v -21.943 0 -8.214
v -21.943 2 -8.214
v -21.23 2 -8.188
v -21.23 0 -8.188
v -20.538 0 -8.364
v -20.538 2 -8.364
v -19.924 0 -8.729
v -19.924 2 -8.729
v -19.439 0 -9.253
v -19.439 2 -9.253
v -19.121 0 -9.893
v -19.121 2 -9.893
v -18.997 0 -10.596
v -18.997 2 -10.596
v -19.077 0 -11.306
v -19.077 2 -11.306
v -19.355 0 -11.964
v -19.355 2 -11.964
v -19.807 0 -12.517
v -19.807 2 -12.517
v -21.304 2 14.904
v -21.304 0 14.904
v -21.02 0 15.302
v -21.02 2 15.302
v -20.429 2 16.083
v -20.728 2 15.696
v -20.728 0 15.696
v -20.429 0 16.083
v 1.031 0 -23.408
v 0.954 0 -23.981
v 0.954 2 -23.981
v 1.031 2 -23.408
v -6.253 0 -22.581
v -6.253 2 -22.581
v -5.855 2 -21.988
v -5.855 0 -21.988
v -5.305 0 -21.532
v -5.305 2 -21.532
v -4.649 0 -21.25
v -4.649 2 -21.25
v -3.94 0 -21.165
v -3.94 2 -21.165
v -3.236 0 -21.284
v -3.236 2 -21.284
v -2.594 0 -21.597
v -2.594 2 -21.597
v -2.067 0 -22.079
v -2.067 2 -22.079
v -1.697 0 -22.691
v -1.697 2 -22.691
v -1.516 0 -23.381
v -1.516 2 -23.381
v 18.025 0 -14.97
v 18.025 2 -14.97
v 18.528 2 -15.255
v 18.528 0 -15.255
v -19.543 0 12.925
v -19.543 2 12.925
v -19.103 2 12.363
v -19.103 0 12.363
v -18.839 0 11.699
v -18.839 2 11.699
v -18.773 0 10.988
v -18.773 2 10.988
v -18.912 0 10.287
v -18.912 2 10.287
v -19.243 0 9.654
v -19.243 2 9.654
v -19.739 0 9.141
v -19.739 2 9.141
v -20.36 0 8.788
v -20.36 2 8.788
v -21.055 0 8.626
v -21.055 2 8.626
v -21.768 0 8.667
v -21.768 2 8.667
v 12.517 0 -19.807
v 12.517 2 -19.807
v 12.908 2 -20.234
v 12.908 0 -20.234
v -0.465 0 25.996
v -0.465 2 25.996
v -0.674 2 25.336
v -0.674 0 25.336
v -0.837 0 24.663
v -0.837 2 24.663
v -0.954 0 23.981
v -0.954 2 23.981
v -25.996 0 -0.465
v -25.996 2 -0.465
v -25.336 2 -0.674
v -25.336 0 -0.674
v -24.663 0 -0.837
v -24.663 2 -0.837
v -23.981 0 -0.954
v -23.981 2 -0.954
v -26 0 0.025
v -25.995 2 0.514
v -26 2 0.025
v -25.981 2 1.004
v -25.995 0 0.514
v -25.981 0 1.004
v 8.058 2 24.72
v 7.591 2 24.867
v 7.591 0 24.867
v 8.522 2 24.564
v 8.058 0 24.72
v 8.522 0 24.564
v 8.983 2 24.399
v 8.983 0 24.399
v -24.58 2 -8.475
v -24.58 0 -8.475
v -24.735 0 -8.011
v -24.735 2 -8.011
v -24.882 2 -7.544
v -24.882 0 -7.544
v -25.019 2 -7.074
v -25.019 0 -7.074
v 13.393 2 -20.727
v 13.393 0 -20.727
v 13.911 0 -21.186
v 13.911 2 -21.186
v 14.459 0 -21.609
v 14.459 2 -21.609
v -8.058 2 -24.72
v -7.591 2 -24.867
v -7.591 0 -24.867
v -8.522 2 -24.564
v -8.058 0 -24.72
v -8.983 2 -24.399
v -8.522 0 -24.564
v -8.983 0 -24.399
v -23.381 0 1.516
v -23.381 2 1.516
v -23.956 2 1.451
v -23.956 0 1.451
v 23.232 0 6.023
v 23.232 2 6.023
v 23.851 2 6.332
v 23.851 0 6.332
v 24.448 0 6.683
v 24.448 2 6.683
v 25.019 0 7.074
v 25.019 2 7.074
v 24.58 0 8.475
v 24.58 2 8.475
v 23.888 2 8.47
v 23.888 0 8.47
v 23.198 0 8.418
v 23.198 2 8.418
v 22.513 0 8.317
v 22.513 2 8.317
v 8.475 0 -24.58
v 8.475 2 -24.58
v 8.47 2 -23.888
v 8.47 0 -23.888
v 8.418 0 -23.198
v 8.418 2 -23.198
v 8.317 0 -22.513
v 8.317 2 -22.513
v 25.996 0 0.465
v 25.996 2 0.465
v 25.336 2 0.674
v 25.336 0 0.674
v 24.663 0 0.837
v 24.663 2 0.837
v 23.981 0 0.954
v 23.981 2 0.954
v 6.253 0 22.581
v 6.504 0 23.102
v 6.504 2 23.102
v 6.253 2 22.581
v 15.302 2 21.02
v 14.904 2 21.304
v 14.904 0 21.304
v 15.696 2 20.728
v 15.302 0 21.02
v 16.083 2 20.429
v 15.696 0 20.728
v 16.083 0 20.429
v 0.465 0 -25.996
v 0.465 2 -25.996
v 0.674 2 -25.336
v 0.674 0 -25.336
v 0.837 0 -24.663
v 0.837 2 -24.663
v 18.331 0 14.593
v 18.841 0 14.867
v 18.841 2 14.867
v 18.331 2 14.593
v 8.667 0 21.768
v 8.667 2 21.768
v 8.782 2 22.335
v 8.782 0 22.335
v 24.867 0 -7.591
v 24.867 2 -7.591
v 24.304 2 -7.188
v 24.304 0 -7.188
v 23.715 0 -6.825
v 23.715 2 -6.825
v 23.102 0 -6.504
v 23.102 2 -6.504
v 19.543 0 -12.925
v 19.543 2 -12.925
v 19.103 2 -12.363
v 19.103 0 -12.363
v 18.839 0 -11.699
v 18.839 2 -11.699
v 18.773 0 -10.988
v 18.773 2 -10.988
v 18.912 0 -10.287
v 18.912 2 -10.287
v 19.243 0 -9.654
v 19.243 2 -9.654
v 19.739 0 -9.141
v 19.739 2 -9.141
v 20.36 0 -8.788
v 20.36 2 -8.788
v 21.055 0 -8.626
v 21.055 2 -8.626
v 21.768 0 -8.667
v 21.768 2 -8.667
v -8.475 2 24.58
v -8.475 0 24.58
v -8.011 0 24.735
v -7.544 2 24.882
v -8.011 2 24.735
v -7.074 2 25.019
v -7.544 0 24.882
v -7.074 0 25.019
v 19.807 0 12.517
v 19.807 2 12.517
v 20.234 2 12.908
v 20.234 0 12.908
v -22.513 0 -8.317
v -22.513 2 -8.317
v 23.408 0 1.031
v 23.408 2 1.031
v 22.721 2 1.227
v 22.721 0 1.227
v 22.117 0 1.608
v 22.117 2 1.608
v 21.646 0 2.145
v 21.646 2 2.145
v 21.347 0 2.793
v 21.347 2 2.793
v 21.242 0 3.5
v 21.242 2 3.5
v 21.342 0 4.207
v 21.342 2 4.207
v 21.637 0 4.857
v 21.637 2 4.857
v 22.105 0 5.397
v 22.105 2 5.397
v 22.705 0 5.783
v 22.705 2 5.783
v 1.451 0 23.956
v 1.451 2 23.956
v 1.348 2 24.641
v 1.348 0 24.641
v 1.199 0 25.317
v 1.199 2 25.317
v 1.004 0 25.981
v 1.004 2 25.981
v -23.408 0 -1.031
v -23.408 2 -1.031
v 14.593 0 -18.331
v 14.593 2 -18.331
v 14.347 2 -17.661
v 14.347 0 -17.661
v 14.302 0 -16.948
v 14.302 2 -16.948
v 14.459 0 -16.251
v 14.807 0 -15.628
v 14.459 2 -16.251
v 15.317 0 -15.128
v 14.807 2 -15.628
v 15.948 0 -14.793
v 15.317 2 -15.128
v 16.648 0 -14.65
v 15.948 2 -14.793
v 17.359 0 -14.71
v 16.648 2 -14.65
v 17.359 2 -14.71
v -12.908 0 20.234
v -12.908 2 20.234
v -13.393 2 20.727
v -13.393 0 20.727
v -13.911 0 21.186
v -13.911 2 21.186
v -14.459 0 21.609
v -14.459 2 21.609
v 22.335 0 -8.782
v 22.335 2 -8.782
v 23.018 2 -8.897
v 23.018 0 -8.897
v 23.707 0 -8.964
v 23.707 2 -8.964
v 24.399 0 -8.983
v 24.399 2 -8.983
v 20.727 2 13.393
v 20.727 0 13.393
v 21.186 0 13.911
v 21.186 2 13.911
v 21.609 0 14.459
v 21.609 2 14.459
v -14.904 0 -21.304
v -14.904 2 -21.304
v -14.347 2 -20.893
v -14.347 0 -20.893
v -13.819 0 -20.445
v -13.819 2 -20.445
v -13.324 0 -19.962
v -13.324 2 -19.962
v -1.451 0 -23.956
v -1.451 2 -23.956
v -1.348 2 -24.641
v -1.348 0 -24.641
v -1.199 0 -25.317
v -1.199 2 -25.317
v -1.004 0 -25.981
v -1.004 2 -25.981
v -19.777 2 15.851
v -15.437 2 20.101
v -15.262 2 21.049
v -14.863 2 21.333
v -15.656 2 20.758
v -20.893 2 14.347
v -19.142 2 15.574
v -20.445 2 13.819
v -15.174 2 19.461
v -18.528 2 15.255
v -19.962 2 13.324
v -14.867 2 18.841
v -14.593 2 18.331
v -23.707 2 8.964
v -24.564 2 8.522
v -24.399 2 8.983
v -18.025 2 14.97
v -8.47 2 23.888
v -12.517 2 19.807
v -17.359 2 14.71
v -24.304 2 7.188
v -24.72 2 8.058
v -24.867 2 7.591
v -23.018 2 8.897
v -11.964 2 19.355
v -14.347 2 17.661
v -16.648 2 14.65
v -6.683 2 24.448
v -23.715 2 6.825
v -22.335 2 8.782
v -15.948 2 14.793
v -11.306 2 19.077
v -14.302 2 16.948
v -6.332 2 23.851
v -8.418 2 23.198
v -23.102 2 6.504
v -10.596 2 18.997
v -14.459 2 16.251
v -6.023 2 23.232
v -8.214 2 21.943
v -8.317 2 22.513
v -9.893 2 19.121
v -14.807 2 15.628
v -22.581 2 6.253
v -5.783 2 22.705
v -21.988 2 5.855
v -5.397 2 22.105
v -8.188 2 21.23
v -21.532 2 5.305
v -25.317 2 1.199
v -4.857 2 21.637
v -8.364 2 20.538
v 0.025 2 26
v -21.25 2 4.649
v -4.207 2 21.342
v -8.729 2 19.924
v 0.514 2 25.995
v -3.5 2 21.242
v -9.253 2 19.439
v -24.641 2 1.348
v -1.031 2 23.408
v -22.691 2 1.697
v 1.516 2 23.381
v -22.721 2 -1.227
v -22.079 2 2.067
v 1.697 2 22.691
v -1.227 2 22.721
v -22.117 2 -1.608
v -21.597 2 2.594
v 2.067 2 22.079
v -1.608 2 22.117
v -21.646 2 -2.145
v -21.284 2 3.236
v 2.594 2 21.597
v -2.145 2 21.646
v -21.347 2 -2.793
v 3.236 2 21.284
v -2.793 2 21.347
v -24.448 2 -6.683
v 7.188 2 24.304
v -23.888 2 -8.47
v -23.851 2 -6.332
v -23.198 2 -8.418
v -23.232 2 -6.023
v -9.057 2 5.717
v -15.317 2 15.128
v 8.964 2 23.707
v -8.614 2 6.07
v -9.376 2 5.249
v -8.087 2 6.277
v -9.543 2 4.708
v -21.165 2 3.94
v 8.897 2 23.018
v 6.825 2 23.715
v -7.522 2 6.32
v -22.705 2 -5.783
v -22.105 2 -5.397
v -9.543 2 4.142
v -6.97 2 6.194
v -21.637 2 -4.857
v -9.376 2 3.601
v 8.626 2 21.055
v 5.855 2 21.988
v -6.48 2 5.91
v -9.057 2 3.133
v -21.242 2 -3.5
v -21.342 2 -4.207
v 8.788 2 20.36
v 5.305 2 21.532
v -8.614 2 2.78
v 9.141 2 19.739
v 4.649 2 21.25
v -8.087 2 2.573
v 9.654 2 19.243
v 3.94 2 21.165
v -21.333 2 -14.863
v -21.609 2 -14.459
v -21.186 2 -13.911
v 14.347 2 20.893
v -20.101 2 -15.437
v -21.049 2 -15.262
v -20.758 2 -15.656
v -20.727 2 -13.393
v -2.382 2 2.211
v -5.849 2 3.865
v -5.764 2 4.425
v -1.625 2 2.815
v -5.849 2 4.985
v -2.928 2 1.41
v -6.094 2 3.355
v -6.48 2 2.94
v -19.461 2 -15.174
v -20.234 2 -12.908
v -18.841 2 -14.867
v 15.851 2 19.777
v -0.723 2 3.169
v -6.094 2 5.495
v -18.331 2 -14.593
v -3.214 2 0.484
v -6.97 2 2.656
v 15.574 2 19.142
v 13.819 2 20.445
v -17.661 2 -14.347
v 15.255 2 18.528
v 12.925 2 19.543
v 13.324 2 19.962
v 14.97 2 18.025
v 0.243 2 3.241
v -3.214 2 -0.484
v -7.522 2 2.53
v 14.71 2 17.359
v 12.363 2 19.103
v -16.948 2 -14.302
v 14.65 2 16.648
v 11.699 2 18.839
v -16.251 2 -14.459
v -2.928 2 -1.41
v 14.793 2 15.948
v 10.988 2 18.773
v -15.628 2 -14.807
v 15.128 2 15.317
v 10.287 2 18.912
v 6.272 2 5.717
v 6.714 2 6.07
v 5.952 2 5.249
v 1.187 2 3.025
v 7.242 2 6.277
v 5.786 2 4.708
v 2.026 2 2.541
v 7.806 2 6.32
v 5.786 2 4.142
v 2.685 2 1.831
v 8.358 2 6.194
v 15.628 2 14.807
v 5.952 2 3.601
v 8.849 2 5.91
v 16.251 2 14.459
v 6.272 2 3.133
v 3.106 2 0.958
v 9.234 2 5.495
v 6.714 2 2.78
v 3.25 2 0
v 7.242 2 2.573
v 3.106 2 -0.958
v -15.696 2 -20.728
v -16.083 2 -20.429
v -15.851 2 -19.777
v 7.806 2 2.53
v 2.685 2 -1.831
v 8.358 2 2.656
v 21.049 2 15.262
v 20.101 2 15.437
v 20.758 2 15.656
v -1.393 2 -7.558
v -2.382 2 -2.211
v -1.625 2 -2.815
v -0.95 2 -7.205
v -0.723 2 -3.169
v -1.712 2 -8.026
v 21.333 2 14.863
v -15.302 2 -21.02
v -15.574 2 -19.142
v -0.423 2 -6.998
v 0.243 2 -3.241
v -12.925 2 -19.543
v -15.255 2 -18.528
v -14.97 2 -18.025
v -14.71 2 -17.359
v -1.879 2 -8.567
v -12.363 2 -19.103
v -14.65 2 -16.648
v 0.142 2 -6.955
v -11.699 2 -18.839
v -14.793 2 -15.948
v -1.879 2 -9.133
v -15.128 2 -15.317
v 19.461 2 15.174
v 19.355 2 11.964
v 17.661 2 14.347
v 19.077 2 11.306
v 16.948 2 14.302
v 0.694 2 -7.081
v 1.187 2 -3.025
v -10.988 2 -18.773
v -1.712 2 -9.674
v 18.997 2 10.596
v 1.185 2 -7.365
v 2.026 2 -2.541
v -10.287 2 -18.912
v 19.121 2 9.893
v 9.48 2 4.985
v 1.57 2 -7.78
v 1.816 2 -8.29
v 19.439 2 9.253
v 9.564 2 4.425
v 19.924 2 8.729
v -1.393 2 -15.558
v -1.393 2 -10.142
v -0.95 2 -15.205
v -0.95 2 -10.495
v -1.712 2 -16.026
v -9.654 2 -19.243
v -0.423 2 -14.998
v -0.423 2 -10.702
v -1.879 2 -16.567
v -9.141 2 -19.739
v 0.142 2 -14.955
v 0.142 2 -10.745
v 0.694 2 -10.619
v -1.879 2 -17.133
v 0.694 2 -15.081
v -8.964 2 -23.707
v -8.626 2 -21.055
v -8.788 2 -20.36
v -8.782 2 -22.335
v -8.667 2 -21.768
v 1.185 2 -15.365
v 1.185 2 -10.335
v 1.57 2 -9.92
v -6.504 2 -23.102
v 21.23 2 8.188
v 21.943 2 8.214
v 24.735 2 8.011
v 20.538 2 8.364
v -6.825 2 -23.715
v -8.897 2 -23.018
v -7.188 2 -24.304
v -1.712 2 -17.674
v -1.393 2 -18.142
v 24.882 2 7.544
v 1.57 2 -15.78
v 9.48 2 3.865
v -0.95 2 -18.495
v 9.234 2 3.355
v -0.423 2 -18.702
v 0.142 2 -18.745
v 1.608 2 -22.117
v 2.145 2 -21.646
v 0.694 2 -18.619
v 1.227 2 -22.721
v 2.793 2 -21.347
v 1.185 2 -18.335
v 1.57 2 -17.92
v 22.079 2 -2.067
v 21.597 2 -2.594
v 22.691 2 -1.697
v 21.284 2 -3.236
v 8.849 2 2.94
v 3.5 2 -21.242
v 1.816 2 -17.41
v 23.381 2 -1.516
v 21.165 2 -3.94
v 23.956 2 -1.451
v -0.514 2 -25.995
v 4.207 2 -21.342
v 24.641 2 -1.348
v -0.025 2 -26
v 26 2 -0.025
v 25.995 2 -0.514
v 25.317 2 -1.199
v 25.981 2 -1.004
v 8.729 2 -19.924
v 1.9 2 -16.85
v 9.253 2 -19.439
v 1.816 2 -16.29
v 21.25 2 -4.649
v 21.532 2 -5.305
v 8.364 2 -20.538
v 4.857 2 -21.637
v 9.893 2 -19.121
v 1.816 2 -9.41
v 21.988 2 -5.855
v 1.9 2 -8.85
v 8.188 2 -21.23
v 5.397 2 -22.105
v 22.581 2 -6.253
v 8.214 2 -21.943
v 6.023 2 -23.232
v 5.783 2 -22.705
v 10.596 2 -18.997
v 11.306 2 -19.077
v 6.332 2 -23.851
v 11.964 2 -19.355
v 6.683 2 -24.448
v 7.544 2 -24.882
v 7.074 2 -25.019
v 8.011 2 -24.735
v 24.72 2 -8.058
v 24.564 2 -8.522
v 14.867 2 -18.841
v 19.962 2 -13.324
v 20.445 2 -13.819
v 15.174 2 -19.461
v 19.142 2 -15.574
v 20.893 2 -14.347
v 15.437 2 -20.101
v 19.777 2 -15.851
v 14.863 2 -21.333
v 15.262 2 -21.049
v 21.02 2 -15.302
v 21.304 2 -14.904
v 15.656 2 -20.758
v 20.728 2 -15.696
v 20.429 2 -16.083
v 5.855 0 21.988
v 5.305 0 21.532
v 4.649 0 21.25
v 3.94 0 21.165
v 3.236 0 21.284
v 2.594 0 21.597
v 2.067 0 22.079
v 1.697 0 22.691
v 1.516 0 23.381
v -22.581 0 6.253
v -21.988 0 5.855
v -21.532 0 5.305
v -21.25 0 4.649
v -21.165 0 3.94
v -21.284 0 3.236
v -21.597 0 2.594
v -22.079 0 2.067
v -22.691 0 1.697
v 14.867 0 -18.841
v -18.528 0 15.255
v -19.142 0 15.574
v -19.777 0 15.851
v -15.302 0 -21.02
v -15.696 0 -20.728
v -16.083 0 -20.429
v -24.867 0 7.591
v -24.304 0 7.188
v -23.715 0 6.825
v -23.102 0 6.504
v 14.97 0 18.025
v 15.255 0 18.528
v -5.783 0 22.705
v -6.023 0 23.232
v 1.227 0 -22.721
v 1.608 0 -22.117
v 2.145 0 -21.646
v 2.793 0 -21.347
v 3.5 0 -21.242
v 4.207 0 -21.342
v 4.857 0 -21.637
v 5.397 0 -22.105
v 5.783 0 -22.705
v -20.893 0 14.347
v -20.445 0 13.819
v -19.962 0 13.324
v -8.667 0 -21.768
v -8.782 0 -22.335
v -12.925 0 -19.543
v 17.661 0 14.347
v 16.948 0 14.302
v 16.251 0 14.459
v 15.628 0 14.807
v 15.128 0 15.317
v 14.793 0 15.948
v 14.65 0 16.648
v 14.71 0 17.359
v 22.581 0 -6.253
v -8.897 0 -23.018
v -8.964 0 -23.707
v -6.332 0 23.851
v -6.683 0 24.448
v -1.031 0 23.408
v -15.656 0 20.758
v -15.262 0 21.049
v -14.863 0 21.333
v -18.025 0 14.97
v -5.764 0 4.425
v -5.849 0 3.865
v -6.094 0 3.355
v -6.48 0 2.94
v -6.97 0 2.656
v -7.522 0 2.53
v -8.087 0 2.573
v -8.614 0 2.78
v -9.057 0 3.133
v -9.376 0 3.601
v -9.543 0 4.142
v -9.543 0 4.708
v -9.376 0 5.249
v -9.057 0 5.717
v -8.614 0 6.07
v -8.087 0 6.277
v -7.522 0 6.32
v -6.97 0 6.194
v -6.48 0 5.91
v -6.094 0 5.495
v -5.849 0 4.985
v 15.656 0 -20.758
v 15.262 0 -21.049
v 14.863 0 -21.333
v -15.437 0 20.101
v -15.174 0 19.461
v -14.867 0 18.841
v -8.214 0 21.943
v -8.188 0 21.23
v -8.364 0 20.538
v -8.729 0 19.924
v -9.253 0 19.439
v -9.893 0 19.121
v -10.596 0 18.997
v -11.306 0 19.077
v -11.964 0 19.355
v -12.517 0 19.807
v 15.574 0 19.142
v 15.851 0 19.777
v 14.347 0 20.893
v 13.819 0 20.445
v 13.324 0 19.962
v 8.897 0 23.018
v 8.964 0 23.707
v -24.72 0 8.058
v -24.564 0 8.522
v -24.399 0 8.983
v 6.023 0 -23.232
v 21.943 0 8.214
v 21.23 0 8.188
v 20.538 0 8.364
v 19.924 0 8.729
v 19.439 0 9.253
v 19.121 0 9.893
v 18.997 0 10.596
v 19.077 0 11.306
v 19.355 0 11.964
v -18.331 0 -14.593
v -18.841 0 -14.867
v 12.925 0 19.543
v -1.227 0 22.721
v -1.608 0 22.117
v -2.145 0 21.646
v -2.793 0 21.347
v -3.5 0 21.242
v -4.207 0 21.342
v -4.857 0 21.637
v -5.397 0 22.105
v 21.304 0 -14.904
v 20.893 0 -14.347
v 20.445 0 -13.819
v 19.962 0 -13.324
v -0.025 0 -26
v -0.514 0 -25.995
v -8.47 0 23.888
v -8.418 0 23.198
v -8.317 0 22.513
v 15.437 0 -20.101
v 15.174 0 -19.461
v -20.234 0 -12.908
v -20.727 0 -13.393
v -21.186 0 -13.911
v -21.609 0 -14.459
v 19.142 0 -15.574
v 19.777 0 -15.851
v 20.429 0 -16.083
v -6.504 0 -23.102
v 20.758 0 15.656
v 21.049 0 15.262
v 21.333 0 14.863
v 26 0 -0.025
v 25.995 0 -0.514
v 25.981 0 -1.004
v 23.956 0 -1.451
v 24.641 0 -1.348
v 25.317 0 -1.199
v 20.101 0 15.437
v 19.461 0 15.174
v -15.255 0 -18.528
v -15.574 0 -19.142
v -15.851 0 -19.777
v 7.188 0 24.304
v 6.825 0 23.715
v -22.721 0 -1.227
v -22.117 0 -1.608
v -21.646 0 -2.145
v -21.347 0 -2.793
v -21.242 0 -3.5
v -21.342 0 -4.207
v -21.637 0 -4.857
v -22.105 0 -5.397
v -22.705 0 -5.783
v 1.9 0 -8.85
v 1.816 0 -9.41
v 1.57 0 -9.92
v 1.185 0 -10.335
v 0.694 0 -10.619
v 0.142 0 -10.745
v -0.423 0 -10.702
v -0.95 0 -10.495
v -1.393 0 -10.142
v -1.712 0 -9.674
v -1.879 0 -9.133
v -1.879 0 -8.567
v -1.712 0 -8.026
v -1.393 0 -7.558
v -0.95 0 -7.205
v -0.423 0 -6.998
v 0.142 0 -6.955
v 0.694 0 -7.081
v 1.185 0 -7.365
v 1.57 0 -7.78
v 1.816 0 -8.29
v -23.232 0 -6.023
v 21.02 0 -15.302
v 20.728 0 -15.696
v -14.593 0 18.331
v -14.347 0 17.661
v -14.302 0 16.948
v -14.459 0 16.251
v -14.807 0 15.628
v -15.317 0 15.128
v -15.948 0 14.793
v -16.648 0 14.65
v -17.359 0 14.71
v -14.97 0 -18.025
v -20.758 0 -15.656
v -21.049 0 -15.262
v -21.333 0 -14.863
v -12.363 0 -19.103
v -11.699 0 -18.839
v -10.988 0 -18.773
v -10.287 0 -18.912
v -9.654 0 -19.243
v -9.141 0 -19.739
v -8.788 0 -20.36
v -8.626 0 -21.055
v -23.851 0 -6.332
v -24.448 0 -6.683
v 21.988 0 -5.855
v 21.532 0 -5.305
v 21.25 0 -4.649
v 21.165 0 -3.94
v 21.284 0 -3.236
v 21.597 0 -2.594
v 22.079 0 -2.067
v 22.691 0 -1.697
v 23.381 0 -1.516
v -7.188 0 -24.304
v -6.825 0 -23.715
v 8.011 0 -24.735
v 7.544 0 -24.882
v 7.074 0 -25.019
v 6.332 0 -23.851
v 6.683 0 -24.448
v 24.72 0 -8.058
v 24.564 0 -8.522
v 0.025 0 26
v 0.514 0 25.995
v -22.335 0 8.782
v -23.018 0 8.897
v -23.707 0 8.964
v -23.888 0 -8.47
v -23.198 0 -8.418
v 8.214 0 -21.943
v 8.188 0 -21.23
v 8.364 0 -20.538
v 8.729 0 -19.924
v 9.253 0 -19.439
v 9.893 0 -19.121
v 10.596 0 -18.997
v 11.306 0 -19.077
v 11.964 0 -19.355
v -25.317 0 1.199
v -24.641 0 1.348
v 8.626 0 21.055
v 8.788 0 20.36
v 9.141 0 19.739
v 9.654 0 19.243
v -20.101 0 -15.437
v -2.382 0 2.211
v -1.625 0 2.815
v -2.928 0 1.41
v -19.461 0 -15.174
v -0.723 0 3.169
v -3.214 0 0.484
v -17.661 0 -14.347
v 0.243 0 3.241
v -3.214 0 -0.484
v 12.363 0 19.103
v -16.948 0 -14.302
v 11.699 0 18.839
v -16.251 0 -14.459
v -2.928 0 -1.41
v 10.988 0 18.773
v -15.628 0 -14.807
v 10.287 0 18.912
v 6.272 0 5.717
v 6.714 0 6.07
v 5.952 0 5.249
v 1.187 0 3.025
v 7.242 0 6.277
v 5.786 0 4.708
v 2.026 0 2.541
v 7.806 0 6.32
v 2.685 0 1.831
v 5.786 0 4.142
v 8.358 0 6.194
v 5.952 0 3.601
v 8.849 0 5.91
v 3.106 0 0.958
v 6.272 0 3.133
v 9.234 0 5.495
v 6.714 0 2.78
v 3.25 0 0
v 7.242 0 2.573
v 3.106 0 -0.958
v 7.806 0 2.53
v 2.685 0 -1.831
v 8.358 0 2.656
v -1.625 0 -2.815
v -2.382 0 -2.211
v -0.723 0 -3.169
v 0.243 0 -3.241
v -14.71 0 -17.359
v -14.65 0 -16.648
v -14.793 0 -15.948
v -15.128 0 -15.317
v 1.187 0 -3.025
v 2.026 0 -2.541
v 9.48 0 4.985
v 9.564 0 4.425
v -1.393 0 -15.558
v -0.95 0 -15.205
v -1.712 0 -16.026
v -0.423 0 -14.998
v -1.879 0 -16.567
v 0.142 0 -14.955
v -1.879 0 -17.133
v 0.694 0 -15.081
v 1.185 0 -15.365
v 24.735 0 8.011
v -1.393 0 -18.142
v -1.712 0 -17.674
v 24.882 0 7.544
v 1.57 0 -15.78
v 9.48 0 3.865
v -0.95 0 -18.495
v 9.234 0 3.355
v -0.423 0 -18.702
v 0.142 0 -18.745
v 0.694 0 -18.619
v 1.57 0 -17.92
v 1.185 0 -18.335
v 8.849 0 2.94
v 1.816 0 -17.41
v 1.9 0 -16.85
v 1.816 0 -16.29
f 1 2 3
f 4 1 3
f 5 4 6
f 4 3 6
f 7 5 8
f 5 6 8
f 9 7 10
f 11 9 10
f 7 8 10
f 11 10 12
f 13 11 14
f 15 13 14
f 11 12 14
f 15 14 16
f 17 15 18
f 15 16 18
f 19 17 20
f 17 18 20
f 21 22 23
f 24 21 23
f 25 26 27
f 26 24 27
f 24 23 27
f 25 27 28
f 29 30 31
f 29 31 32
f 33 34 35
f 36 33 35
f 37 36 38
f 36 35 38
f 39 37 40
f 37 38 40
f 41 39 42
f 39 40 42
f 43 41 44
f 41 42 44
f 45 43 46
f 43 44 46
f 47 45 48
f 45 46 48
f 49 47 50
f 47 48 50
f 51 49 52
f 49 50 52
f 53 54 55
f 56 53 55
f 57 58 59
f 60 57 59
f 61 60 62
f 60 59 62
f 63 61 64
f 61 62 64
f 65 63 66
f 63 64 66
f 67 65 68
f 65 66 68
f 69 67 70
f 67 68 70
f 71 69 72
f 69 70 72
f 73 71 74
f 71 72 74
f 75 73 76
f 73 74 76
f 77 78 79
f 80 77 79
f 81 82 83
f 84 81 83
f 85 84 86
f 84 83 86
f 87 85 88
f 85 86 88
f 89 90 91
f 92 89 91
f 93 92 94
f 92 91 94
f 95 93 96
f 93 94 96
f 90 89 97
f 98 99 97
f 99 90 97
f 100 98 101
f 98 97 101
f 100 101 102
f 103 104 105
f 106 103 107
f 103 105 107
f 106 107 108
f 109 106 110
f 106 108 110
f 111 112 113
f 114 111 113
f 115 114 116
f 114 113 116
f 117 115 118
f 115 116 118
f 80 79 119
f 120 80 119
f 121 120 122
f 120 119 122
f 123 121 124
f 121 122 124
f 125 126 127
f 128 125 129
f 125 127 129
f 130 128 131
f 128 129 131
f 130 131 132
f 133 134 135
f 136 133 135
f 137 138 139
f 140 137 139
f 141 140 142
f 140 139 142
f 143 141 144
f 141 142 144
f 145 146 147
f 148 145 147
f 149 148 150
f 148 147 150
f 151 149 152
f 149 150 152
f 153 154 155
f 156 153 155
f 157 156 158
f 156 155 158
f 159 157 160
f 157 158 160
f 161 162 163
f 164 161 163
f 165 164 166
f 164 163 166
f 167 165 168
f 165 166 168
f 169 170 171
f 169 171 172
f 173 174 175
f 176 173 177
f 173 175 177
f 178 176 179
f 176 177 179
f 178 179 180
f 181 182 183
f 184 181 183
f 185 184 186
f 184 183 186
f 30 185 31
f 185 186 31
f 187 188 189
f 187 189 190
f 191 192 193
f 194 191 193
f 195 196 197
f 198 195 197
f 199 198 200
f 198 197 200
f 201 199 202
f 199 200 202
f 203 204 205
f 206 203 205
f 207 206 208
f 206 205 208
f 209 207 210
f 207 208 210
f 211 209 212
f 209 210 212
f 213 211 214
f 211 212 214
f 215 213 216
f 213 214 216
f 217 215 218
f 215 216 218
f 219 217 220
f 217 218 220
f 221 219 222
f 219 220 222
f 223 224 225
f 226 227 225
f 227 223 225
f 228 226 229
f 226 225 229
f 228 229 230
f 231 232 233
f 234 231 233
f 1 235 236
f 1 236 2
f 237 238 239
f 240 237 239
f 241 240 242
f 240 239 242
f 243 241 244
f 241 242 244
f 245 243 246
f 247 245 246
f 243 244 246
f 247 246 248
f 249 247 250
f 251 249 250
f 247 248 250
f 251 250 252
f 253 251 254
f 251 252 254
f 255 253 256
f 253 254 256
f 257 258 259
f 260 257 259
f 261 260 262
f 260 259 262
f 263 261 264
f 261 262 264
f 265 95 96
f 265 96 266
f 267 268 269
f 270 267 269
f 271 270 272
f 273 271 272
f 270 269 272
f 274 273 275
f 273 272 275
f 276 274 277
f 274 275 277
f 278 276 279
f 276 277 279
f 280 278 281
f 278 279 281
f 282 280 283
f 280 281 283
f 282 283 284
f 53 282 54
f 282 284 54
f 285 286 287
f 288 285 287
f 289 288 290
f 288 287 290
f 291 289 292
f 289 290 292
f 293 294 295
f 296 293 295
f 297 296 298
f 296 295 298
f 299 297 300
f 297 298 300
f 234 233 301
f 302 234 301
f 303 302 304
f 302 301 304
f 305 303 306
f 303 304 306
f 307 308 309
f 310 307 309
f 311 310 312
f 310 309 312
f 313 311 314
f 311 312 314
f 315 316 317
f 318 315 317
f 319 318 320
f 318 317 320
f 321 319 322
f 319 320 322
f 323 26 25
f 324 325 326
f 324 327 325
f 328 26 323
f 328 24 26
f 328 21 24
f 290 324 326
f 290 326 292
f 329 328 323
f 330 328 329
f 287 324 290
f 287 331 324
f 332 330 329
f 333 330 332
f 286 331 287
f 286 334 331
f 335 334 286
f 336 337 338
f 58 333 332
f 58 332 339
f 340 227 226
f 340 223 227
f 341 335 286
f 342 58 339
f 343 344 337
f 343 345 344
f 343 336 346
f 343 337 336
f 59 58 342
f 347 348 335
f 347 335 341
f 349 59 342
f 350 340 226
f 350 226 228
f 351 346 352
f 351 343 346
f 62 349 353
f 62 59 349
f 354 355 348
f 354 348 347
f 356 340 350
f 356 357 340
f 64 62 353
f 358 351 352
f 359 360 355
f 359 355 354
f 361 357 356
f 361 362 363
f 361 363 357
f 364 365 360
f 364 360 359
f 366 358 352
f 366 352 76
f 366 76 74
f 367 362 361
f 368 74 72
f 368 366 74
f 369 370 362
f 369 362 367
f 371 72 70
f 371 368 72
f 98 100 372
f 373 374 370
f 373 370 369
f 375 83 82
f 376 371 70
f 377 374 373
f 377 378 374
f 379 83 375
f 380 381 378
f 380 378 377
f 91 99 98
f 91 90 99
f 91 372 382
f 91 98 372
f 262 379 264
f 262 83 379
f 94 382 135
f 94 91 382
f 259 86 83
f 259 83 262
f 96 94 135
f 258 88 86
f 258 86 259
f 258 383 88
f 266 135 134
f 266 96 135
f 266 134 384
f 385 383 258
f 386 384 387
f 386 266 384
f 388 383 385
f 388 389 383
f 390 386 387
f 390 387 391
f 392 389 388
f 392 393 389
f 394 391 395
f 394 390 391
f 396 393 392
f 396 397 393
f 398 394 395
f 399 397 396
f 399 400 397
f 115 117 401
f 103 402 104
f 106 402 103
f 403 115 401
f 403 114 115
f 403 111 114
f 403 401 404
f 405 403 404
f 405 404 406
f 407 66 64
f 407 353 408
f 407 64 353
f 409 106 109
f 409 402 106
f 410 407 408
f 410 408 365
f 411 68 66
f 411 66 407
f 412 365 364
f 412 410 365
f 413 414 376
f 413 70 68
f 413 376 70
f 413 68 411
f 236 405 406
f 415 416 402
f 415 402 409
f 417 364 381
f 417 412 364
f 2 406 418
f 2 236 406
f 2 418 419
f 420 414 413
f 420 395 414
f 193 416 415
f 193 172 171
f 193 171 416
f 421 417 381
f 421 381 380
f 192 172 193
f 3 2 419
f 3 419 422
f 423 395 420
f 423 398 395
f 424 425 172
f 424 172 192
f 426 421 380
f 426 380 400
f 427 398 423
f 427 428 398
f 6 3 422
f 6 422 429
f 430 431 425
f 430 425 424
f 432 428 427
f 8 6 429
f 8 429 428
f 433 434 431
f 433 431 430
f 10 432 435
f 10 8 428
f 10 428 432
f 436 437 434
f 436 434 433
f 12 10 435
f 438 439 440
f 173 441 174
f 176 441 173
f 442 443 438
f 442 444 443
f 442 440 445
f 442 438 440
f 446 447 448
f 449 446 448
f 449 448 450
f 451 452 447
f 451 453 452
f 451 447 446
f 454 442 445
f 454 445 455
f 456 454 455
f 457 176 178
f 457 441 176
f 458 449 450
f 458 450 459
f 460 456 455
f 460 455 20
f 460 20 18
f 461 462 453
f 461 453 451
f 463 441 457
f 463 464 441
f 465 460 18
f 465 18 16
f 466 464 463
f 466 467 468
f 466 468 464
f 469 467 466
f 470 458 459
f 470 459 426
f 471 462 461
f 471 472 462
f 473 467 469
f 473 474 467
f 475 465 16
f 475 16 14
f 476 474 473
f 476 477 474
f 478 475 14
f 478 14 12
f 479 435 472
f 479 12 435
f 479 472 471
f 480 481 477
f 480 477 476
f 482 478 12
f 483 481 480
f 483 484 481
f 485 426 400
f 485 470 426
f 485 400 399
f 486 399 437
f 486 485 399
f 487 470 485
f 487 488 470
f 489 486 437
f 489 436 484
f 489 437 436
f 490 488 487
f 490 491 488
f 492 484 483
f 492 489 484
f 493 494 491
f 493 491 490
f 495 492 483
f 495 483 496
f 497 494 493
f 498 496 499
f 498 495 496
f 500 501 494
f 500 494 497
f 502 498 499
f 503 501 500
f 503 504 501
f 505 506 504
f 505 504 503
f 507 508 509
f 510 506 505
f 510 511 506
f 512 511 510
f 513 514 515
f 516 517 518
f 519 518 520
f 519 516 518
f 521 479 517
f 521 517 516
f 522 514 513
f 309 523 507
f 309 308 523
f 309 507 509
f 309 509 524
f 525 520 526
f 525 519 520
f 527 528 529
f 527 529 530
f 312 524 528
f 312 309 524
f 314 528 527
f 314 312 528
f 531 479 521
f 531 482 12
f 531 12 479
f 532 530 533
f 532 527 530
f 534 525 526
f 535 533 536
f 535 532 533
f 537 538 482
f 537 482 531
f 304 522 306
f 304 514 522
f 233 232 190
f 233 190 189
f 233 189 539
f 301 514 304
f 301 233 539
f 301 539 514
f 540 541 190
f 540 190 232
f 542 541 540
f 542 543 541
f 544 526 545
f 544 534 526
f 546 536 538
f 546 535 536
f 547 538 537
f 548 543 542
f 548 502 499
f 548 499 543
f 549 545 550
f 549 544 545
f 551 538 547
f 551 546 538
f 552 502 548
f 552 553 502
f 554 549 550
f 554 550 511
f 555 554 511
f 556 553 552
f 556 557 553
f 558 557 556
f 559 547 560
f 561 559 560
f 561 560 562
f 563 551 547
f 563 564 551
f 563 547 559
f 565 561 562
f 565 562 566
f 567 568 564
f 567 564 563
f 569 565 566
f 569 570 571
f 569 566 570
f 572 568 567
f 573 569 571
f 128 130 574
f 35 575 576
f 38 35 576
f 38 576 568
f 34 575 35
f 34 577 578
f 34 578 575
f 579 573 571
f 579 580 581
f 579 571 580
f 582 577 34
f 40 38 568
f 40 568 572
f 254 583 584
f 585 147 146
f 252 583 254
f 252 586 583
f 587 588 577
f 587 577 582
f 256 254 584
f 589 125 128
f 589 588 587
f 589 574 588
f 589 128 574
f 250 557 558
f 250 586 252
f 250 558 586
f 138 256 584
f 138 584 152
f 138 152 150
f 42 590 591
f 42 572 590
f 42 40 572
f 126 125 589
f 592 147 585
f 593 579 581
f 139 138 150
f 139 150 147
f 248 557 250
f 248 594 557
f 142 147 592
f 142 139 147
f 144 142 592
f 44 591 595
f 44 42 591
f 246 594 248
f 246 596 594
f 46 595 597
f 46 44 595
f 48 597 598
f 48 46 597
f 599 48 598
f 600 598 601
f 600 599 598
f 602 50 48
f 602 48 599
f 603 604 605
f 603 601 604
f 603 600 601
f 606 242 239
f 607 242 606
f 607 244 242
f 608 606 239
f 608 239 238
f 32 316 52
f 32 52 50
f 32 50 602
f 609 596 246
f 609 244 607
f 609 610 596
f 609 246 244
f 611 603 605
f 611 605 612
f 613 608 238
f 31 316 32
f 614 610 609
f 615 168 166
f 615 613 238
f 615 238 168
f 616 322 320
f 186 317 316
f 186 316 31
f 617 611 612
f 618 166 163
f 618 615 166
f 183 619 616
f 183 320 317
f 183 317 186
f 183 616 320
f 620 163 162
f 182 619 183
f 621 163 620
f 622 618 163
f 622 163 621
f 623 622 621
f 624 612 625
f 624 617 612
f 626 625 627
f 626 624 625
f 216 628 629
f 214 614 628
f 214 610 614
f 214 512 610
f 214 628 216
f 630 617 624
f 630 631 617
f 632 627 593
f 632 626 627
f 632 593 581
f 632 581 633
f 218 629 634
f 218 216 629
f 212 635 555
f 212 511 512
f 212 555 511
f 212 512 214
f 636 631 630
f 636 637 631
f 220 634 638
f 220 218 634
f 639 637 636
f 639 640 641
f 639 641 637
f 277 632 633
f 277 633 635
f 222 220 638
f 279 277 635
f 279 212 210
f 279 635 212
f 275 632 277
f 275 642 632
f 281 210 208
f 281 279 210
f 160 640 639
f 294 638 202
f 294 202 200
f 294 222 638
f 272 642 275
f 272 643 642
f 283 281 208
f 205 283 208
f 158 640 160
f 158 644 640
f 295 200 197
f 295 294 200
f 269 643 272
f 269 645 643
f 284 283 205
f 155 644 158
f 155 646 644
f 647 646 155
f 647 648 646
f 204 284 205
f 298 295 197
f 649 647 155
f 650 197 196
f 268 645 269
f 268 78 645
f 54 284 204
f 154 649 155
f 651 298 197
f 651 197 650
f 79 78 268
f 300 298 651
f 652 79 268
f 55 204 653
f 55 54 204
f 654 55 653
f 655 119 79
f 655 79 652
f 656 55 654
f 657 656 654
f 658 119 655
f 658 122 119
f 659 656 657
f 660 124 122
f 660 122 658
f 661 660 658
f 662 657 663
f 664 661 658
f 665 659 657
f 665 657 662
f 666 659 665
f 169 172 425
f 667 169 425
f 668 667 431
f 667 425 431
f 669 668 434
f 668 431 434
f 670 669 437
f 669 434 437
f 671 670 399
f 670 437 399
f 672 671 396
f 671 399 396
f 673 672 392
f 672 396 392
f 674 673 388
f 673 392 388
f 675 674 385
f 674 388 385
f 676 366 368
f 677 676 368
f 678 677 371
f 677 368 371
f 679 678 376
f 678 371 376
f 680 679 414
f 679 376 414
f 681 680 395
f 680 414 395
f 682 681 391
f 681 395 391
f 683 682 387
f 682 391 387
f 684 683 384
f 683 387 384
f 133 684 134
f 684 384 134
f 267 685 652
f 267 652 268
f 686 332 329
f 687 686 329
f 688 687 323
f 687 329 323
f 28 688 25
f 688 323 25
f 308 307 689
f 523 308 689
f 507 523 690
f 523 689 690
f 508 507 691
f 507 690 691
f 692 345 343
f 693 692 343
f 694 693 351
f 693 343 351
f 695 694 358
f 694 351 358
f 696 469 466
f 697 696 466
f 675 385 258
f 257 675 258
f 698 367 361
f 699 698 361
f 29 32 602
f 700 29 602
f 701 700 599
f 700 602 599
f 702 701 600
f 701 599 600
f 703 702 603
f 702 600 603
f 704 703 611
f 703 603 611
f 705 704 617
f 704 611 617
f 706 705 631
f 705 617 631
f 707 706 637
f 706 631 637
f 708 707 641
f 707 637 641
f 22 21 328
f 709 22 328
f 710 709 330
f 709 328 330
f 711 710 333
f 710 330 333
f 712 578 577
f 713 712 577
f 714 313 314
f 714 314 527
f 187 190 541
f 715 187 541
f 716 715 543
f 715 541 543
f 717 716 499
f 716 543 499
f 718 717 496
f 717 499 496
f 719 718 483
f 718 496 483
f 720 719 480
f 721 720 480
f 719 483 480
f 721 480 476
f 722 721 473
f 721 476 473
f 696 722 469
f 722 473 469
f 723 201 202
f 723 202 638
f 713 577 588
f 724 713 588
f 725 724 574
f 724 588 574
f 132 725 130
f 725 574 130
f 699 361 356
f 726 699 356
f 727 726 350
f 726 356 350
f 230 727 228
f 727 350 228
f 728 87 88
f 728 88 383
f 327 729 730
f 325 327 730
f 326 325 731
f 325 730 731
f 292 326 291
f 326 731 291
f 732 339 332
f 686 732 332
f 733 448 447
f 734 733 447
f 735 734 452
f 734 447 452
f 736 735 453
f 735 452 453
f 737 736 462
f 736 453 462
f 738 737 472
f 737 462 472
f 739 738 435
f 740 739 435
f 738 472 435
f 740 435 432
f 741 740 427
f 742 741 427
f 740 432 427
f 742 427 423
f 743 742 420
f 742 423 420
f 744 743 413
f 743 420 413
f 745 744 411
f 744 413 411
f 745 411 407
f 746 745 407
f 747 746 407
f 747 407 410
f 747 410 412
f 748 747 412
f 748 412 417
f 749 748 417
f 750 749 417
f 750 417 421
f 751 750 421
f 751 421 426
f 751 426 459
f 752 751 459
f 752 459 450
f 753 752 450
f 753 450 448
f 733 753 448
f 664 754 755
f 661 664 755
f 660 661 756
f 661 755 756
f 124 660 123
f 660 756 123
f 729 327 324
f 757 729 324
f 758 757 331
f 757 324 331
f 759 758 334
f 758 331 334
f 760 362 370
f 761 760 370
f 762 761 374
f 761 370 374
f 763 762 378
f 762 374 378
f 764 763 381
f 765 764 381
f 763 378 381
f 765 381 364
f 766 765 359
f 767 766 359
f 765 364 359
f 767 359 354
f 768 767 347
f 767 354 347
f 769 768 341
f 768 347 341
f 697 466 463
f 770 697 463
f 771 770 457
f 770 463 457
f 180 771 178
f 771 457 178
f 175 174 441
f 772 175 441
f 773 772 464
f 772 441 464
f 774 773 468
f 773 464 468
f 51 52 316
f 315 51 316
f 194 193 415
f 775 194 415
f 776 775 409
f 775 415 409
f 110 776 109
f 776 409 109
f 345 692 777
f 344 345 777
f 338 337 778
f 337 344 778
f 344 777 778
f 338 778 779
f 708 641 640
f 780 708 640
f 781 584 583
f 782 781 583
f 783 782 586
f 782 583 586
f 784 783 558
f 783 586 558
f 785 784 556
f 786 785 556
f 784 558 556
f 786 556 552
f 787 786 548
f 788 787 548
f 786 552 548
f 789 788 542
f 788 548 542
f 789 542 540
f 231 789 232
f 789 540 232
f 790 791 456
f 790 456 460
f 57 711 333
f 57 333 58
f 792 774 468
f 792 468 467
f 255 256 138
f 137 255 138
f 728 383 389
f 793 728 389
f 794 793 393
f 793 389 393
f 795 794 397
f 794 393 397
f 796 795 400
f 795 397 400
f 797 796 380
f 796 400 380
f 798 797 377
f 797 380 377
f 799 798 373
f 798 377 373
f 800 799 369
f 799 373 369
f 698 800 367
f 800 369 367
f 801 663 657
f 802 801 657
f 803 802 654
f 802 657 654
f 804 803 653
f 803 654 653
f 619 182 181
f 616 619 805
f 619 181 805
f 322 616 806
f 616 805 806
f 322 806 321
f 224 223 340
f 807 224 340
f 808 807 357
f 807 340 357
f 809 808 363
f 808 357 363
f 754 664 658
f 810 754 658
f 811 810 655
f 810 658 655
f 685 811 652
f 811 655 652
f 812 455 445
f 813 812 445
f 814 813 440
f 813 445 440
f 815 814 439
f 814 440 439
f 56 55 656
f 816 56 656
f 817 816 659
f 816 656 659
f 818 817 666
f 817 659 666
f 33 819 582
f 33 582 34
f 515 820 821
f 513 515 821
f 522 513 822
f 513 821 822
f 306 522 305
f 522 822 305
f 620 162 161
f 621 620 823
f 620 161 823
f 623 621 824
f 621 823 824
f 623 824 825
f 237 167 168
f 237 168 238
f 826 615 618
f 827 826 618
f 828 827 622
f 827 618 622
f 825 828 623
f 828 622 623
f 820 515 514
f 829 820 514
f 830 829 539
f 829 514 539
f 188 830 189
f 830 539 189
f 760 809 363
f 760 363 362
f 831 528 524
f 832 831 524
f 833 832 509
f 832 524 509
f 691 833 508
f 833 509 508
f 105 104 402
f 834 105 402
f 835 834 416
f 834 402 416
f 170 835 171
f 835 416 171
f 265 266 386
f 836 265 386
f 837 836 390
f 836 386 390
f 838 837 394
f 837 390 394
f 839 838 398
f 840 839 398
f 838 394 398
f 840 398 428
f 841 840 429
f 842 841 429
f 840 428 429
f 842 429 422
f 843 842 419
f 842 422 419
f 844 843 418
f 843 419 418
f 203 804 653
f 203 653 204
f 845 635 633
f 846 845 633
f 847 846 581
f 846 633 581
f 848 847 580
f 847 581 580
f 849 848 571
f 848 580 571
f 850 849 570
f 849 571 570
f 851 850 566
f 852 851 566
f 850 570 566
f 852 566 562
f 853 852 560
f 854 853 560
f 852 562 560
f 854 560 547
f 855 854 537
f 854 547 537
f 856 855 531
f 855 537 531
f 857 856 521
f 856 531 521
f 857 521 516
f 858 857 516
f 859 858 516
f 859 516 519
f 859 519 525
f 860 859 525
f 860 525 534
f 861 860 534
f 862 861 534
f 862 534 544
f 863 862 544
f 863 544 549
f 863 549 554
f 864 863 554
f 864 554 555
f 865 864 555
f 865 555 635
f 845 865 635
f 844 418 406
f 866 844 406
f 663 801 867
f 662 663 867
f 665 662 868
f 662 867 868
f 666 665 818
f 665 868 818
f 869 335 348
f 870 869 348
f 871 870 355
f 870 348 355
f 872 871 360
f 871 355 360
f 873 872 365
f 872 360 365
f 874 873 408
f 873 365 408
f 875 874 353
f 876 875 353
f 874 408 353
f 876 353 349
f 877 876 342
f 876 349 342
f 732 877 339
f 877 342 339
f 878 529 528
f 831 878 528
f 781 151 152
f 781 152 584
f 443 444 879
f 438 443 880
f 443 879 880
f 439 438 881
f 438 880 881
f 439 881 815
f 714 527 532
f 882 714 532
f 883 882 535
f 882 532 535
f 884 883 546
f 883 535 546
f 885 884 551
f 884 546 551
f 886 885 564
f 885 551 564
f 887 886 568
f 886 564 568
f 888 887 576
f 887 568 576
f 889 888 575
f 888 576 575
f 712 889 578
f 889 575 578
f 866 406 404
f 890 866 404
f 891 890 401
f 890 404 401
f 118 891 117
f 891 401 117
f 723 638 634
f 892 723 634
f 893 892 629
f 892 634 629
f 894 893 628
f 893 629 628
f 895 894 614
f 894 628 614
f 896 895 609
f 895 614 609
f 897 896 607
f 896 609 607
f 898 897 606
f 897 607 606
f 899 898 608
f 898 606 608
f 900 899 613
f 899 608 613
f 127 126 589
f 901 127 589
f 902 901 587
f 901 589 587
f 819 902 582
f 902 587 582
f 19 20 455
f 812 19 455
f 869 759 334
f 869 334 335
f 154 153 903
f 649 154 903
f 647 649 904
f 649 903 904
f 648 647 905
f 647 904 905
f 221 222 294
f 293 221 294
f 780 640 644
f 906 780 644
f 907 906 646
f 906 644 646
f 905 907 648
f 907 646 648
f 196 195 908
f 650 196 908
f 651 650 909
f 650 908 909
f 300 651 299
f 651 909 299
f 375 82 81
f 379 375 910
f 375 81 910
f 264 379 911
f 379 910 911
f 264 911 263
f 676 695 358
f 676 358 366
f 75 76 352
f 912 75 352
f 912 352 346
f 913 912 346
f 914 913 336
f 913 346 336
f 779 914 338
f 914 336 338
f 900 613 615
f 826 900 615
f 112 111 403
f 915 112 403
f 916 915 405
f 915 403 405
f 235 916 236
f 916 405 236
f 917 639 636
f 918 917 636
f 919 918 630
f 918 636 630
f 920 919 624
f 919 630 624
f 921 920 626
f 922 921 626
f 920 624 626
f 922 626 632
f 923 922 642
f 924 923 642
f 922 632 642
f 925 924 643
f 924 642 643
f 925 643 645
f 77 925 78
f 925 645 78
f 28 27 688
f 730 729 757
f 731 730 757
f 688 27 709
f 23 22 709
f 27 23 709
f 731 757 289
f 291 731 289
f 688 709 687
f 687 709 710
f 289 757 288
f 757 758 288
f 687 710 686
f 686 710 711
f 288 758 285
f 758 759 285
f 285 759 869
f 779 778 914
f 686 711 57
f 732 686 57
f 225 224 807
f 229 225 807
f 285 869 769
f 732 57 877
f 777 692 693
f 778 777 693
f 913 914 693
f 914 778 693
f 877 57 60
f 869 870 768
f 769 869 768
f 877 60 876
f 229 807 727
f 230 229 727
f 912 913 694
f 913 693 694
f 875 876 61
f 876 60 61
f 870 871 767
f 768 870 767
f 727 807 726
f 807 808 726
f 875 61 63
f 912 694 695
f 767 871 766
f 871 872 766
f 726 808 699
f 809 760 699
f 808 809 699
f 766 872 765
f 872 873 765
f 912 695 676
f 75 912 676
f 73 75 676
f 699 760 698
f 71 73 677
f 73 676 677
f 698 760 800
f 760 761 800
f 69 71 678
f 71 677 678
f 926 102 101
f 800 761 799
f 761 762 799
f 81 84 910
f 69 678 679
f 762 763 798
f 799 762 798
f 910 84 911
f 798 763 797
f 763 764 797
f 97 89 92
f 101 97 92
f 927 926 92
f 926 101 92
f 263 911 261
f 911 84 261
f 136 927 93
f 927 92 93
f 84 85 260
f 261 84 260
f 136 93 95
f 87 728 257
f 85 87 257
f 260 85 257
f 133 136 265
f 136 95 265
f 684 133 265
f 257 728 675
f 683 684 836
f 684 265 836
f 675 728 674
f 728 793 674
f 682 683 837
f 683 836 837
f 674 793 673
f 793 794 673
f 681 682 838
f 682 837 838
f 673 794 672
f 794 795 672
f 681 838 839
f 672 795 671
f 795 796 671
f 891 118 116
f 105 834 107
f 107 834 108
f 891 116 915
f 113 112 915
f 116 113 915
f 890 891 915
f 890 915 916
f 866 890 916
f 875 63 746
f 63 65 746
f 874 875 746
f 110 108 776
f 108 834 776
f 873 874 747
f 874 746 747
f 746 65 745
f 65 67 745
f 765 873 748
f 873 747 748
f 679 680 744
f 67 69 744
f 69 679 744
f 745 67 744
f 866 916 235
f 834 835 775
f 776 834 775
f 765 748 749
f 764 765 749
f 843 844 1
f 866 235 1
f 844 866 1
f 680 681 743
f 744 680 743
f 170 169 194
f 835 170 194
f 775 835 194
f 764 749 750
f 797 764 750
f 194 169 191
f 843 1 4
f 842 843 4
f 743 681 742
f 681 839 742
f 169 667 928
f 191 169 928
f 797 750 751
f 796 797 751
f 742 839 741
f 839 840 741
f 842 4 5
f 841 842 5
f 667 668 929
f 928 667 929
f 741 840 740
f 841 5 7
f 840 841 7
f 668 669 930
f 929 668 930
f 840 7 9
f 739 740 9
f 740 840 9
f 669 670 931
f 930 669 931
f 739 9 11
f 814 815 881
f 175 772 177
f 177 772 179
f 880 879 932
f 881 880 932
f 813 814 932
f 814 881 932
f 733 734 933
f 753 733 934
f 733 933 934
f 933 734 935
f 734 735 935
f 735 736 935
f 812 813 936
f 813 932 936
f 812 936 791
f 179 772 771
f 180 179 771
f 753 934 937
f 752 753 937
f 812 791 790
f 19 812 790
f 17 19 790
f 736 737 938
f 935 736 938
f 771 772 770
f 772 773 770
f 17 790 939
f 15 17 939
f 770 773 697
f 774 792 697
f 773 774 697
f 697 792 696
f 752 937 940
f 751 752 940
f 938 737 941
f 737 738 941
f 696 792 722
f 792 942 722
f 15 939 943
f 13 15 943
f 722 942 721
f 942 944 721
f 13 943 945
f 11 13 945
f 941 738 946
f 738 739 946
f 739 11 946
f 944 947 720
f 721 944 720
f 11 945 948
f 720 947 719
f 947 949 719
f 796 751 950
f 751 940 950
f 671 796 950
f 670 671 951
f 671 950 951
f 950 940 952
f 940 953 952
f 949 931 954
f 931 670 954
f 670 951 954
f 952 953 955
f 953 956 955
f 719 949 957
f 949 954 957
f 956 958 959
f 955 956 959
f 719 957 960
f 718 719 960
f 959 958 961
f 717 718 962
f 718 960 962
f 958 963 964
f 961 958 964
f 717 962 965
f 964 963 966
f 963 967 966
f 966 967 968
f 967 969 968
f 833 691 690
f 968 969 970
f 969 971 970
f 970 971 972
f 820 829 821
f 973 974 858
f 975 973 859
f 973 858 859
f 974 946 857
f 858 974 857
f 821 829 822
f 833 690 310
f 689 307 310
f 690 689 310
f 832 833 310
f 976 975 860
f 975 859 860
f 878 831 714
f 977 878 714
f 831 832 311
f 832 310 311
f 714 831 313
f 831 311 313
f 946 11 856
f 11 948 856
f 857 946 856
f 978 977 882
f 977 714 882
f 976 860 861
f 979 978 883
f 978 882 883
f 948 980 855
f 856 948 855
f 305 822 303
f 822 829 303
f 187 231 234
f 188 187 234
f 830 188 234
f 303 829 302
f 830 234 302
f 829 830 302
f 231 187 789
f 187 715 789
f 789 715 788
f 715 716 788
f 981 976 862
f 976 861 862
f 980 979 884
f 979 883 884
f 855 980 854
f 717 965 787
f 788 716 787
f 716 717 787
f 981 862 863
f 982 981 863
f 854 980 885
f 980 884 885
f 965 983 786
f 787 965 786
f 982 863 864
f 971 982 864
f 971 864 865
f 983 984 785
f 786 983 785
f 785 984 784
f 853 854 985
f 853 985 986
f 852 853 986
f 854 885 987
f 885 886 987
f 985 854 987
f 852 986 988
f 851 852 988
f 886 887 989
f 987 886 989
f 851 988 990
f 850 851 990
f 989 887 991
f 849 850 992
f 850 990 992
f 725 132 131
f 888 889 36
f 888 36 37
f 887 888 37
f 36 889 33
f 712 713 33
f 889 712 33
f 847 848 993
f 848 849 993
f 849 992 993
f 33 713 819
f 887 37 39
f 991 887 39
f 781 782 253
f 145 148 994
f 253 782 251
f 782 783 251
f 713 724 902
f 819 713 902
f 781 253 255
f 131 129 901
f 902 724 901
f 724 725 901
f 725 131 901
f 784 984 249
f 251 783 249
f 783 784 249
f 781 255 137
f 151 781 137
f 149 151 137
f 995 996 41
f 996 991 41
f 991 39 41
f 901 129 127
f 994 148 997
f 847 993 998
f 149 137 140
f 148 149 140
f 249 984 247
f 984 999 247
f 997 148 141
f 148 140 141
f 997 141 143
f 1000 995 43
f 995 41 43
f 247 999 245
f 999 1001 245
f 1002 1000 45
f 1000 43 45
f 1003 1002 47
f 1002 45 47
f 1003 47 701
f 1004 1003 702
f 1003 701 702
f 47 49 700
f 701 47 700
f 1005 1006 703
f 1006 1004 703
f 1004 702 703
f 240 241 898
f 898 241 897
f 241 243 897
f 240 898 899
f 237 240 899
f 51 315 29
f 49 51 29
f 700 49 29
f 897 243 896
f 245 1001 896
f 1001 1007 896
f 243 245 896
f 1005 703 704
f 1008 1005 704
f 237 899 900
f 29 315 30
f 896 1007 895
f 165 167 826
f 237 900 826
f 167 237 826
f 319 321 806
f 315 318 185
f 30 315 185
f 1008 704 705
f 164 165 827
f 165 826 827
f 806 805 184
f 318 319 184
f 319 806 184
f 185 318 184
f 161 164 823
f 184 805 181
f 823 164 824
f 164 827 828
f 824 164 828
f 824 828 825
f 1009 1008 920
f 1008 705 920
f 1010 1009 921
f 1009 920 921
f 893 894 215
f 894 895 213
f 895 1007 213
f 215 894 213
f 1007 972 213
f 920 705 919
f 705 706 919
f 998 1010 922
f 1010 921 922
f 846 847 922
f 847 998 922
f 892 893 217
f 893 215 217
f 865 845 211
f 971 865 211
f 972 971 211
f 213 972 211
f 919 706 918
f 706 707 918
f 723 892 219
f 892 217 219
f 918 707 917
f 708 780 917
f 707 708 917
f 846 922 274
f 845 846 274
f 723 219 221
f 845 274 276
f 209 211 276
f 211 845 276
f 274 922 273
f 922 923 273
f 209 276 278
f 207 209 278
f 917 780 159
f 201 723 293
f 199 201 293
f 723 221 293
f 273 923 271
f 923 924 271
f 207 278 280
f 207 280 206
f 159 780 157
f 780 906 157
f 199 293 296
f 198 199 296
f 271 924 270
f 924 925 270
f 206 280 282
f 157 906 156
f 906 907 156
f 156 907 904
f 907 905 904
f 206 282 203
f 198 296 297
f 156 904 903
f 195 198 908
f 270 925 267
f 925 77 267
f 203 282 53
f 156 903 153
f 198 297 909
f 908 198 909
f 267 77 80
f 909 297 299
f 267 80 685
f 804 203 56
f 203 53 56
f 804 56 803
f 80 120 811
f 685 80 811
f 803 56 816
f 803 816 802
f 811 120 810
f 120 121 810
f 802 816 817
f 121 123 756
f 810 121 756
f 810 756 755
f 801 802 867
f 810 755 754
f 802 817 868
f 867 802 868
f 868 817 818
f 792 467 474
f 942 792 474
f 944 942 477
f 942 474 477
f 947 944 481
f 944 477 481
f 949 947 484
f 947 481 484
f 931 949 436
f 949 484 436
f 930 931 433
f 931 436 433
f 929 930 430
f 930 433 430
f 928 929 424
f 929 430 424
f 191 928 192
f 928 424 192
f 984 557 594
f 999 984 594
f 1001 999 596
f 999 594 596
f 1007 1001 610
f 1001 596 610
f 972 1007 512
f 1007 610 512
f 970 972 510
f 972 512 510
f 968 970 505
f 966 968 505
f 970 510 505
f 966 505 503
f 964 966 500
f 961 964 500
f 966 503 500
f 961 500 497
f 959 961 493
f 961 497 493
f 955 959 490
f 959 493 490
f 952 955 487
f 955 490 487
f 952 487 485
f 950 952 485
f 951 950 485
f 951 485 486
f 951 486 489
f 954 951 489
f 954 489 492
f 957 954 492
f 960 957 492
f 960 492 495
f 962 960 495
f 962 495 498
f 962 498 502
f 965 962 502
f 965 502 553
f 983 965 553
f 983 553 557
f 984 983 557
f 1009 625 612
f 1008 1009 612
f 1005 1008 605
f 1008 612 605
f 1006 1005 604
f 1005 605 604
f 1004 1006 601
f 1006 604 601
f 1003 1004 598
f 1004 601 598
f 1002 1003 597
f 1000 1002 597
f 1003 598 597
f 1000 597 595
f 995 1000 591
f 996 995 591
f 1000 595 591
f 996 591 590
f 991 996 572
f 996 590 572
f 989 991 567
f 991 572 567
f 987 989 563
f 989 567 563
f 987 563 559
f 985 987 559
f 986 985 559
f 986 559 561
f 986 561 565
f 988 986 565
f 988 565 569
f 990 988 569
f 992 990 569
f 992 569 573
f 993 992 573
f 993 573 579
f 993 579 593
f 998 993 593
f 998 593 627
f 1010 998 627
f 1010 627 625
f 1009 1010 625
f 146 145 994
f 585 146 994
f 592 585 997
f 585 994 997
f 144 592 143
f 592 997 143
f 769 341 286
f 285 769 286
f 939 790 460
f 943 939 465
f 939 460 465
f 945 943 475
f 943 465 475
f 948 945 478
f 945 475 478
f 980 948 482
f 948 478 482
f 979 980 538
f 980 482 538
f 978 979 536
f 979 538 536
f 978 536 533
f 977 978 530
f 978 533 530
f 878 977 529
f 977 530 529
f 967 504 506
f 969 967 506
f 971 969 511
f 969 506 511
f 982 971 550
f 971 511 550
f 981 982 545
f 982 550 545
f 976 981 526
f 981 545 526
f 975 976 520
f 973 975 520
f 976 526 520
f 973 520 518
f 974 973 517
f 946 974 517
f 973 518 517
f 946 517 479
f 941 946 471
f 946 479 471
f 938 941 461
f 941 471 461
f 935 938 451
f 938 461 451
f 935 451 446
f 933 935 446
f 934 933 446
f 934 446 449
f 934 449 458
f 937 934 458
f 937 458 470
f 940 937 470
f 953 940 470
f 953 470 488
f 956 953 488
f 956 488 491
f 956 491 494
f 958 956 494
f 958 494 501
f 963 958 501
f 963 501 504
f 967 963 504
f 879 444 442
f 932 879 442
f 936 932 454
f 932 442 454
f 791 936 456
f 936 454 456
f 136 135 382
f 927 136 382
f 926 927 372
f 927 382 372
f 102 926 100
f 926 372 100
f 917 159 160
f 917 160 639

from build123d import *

# Parameters (mm, degrees)
SKETCH1_R           = 26
BOSS_EXTRUDE1_DEPTH = 2
SKETCH2_R           = 3.25
SKETCH2_R_2         = 1.9
CUT_EXTRUDE1_DEPTH  = 3
CUT_EXTRUDE2_DEPTH  = 10
CIRPATTERN1_COUNT   = 20


with BuildPart() as part:
    # Sketch1 → Boss-Extrude1 (new body)
    with BuildSketch(Plane(origin=(0, 0, 0), x_dir=(1, 0, 0), z_dir=(0, 1, 0))):
        Circle(SKETCH1_R)
    extrude(amount=BOSS_EXTRUDE1_DEPTH)

    # Sketch2 → Cut-Extrude1 (cut, through all)
    with BuildSketch(Plane(origin=(0, 2, 0), x_dir=(1, 0, 0), z_dir=(0, 1, 0))):
        Circle(SKETCH2_R)
        with Locations((0, 8.85)):
            Circle(SKETCH2_R_2)
        with Locations((7.664324823, -4.425)):
            Circle(SKETCH2_R_2)
        with Locations((-7.664324823, -4.425)):
            Circle(SKETCH2_R_2)
        with Locations((0, 16.85)):
            Circle(SKETCH2_R_2)
    extrude(amount=-CUT_EXTRUDE1_DEPTH, mode=Mode.SUBTRACT)

    # Sketch5 → Cut-Extrude2 (cut)
    with BuildSketch(Plane(origin=(0, 2, 0), x_dir=(1, 0, 0), z_dir=(0, 1, 0))):
        with BuildLine():
            ThreePointArc((-7.591229417, 24.867111532), (-7.001593879, 24.012811344), (-6.503694096, 23.101990458))
            Line((-6.503694096, 23.101990458), (-6.252916986, 22.580637882))
            ThreePointArc((-6.252916986, 22.580637882), (-3.583333333, 21.199285889), (-1.516070361, 23.381311098))
            Line((-1.516070361, 23.381311098), (-1.450578836, 23.95612283))
            ThreePointArc((-1.450578836, 23.95612283), (-1.279700655, 24.979987824), (-1.003606428, 25.980623051))
            ThreePointArc((-1.003606428, 25.980623051), (-4.333333333, 25.636345727), (-7.591229417, 24.867111532))
        make_face()
    cut_extrude2 = extrude(amount=-CUT_EXTRUDE2_DEPTH, mode=Mode.SUBTRACT)

    # CirPattern1: Cut-Extrude2 ×20 about axis
    cirpattern1_axis = Axis((0, 0, 0), (0, 1, 0))
    for i in range(1, CIRPATTERN1_COUNT):
        add(cut_extrude2.rotate(cirpattern1_axis, i * 360 / CIRPATTERN1_COUNT), mode=Mode.SUBTRACT)


solid = part.part
